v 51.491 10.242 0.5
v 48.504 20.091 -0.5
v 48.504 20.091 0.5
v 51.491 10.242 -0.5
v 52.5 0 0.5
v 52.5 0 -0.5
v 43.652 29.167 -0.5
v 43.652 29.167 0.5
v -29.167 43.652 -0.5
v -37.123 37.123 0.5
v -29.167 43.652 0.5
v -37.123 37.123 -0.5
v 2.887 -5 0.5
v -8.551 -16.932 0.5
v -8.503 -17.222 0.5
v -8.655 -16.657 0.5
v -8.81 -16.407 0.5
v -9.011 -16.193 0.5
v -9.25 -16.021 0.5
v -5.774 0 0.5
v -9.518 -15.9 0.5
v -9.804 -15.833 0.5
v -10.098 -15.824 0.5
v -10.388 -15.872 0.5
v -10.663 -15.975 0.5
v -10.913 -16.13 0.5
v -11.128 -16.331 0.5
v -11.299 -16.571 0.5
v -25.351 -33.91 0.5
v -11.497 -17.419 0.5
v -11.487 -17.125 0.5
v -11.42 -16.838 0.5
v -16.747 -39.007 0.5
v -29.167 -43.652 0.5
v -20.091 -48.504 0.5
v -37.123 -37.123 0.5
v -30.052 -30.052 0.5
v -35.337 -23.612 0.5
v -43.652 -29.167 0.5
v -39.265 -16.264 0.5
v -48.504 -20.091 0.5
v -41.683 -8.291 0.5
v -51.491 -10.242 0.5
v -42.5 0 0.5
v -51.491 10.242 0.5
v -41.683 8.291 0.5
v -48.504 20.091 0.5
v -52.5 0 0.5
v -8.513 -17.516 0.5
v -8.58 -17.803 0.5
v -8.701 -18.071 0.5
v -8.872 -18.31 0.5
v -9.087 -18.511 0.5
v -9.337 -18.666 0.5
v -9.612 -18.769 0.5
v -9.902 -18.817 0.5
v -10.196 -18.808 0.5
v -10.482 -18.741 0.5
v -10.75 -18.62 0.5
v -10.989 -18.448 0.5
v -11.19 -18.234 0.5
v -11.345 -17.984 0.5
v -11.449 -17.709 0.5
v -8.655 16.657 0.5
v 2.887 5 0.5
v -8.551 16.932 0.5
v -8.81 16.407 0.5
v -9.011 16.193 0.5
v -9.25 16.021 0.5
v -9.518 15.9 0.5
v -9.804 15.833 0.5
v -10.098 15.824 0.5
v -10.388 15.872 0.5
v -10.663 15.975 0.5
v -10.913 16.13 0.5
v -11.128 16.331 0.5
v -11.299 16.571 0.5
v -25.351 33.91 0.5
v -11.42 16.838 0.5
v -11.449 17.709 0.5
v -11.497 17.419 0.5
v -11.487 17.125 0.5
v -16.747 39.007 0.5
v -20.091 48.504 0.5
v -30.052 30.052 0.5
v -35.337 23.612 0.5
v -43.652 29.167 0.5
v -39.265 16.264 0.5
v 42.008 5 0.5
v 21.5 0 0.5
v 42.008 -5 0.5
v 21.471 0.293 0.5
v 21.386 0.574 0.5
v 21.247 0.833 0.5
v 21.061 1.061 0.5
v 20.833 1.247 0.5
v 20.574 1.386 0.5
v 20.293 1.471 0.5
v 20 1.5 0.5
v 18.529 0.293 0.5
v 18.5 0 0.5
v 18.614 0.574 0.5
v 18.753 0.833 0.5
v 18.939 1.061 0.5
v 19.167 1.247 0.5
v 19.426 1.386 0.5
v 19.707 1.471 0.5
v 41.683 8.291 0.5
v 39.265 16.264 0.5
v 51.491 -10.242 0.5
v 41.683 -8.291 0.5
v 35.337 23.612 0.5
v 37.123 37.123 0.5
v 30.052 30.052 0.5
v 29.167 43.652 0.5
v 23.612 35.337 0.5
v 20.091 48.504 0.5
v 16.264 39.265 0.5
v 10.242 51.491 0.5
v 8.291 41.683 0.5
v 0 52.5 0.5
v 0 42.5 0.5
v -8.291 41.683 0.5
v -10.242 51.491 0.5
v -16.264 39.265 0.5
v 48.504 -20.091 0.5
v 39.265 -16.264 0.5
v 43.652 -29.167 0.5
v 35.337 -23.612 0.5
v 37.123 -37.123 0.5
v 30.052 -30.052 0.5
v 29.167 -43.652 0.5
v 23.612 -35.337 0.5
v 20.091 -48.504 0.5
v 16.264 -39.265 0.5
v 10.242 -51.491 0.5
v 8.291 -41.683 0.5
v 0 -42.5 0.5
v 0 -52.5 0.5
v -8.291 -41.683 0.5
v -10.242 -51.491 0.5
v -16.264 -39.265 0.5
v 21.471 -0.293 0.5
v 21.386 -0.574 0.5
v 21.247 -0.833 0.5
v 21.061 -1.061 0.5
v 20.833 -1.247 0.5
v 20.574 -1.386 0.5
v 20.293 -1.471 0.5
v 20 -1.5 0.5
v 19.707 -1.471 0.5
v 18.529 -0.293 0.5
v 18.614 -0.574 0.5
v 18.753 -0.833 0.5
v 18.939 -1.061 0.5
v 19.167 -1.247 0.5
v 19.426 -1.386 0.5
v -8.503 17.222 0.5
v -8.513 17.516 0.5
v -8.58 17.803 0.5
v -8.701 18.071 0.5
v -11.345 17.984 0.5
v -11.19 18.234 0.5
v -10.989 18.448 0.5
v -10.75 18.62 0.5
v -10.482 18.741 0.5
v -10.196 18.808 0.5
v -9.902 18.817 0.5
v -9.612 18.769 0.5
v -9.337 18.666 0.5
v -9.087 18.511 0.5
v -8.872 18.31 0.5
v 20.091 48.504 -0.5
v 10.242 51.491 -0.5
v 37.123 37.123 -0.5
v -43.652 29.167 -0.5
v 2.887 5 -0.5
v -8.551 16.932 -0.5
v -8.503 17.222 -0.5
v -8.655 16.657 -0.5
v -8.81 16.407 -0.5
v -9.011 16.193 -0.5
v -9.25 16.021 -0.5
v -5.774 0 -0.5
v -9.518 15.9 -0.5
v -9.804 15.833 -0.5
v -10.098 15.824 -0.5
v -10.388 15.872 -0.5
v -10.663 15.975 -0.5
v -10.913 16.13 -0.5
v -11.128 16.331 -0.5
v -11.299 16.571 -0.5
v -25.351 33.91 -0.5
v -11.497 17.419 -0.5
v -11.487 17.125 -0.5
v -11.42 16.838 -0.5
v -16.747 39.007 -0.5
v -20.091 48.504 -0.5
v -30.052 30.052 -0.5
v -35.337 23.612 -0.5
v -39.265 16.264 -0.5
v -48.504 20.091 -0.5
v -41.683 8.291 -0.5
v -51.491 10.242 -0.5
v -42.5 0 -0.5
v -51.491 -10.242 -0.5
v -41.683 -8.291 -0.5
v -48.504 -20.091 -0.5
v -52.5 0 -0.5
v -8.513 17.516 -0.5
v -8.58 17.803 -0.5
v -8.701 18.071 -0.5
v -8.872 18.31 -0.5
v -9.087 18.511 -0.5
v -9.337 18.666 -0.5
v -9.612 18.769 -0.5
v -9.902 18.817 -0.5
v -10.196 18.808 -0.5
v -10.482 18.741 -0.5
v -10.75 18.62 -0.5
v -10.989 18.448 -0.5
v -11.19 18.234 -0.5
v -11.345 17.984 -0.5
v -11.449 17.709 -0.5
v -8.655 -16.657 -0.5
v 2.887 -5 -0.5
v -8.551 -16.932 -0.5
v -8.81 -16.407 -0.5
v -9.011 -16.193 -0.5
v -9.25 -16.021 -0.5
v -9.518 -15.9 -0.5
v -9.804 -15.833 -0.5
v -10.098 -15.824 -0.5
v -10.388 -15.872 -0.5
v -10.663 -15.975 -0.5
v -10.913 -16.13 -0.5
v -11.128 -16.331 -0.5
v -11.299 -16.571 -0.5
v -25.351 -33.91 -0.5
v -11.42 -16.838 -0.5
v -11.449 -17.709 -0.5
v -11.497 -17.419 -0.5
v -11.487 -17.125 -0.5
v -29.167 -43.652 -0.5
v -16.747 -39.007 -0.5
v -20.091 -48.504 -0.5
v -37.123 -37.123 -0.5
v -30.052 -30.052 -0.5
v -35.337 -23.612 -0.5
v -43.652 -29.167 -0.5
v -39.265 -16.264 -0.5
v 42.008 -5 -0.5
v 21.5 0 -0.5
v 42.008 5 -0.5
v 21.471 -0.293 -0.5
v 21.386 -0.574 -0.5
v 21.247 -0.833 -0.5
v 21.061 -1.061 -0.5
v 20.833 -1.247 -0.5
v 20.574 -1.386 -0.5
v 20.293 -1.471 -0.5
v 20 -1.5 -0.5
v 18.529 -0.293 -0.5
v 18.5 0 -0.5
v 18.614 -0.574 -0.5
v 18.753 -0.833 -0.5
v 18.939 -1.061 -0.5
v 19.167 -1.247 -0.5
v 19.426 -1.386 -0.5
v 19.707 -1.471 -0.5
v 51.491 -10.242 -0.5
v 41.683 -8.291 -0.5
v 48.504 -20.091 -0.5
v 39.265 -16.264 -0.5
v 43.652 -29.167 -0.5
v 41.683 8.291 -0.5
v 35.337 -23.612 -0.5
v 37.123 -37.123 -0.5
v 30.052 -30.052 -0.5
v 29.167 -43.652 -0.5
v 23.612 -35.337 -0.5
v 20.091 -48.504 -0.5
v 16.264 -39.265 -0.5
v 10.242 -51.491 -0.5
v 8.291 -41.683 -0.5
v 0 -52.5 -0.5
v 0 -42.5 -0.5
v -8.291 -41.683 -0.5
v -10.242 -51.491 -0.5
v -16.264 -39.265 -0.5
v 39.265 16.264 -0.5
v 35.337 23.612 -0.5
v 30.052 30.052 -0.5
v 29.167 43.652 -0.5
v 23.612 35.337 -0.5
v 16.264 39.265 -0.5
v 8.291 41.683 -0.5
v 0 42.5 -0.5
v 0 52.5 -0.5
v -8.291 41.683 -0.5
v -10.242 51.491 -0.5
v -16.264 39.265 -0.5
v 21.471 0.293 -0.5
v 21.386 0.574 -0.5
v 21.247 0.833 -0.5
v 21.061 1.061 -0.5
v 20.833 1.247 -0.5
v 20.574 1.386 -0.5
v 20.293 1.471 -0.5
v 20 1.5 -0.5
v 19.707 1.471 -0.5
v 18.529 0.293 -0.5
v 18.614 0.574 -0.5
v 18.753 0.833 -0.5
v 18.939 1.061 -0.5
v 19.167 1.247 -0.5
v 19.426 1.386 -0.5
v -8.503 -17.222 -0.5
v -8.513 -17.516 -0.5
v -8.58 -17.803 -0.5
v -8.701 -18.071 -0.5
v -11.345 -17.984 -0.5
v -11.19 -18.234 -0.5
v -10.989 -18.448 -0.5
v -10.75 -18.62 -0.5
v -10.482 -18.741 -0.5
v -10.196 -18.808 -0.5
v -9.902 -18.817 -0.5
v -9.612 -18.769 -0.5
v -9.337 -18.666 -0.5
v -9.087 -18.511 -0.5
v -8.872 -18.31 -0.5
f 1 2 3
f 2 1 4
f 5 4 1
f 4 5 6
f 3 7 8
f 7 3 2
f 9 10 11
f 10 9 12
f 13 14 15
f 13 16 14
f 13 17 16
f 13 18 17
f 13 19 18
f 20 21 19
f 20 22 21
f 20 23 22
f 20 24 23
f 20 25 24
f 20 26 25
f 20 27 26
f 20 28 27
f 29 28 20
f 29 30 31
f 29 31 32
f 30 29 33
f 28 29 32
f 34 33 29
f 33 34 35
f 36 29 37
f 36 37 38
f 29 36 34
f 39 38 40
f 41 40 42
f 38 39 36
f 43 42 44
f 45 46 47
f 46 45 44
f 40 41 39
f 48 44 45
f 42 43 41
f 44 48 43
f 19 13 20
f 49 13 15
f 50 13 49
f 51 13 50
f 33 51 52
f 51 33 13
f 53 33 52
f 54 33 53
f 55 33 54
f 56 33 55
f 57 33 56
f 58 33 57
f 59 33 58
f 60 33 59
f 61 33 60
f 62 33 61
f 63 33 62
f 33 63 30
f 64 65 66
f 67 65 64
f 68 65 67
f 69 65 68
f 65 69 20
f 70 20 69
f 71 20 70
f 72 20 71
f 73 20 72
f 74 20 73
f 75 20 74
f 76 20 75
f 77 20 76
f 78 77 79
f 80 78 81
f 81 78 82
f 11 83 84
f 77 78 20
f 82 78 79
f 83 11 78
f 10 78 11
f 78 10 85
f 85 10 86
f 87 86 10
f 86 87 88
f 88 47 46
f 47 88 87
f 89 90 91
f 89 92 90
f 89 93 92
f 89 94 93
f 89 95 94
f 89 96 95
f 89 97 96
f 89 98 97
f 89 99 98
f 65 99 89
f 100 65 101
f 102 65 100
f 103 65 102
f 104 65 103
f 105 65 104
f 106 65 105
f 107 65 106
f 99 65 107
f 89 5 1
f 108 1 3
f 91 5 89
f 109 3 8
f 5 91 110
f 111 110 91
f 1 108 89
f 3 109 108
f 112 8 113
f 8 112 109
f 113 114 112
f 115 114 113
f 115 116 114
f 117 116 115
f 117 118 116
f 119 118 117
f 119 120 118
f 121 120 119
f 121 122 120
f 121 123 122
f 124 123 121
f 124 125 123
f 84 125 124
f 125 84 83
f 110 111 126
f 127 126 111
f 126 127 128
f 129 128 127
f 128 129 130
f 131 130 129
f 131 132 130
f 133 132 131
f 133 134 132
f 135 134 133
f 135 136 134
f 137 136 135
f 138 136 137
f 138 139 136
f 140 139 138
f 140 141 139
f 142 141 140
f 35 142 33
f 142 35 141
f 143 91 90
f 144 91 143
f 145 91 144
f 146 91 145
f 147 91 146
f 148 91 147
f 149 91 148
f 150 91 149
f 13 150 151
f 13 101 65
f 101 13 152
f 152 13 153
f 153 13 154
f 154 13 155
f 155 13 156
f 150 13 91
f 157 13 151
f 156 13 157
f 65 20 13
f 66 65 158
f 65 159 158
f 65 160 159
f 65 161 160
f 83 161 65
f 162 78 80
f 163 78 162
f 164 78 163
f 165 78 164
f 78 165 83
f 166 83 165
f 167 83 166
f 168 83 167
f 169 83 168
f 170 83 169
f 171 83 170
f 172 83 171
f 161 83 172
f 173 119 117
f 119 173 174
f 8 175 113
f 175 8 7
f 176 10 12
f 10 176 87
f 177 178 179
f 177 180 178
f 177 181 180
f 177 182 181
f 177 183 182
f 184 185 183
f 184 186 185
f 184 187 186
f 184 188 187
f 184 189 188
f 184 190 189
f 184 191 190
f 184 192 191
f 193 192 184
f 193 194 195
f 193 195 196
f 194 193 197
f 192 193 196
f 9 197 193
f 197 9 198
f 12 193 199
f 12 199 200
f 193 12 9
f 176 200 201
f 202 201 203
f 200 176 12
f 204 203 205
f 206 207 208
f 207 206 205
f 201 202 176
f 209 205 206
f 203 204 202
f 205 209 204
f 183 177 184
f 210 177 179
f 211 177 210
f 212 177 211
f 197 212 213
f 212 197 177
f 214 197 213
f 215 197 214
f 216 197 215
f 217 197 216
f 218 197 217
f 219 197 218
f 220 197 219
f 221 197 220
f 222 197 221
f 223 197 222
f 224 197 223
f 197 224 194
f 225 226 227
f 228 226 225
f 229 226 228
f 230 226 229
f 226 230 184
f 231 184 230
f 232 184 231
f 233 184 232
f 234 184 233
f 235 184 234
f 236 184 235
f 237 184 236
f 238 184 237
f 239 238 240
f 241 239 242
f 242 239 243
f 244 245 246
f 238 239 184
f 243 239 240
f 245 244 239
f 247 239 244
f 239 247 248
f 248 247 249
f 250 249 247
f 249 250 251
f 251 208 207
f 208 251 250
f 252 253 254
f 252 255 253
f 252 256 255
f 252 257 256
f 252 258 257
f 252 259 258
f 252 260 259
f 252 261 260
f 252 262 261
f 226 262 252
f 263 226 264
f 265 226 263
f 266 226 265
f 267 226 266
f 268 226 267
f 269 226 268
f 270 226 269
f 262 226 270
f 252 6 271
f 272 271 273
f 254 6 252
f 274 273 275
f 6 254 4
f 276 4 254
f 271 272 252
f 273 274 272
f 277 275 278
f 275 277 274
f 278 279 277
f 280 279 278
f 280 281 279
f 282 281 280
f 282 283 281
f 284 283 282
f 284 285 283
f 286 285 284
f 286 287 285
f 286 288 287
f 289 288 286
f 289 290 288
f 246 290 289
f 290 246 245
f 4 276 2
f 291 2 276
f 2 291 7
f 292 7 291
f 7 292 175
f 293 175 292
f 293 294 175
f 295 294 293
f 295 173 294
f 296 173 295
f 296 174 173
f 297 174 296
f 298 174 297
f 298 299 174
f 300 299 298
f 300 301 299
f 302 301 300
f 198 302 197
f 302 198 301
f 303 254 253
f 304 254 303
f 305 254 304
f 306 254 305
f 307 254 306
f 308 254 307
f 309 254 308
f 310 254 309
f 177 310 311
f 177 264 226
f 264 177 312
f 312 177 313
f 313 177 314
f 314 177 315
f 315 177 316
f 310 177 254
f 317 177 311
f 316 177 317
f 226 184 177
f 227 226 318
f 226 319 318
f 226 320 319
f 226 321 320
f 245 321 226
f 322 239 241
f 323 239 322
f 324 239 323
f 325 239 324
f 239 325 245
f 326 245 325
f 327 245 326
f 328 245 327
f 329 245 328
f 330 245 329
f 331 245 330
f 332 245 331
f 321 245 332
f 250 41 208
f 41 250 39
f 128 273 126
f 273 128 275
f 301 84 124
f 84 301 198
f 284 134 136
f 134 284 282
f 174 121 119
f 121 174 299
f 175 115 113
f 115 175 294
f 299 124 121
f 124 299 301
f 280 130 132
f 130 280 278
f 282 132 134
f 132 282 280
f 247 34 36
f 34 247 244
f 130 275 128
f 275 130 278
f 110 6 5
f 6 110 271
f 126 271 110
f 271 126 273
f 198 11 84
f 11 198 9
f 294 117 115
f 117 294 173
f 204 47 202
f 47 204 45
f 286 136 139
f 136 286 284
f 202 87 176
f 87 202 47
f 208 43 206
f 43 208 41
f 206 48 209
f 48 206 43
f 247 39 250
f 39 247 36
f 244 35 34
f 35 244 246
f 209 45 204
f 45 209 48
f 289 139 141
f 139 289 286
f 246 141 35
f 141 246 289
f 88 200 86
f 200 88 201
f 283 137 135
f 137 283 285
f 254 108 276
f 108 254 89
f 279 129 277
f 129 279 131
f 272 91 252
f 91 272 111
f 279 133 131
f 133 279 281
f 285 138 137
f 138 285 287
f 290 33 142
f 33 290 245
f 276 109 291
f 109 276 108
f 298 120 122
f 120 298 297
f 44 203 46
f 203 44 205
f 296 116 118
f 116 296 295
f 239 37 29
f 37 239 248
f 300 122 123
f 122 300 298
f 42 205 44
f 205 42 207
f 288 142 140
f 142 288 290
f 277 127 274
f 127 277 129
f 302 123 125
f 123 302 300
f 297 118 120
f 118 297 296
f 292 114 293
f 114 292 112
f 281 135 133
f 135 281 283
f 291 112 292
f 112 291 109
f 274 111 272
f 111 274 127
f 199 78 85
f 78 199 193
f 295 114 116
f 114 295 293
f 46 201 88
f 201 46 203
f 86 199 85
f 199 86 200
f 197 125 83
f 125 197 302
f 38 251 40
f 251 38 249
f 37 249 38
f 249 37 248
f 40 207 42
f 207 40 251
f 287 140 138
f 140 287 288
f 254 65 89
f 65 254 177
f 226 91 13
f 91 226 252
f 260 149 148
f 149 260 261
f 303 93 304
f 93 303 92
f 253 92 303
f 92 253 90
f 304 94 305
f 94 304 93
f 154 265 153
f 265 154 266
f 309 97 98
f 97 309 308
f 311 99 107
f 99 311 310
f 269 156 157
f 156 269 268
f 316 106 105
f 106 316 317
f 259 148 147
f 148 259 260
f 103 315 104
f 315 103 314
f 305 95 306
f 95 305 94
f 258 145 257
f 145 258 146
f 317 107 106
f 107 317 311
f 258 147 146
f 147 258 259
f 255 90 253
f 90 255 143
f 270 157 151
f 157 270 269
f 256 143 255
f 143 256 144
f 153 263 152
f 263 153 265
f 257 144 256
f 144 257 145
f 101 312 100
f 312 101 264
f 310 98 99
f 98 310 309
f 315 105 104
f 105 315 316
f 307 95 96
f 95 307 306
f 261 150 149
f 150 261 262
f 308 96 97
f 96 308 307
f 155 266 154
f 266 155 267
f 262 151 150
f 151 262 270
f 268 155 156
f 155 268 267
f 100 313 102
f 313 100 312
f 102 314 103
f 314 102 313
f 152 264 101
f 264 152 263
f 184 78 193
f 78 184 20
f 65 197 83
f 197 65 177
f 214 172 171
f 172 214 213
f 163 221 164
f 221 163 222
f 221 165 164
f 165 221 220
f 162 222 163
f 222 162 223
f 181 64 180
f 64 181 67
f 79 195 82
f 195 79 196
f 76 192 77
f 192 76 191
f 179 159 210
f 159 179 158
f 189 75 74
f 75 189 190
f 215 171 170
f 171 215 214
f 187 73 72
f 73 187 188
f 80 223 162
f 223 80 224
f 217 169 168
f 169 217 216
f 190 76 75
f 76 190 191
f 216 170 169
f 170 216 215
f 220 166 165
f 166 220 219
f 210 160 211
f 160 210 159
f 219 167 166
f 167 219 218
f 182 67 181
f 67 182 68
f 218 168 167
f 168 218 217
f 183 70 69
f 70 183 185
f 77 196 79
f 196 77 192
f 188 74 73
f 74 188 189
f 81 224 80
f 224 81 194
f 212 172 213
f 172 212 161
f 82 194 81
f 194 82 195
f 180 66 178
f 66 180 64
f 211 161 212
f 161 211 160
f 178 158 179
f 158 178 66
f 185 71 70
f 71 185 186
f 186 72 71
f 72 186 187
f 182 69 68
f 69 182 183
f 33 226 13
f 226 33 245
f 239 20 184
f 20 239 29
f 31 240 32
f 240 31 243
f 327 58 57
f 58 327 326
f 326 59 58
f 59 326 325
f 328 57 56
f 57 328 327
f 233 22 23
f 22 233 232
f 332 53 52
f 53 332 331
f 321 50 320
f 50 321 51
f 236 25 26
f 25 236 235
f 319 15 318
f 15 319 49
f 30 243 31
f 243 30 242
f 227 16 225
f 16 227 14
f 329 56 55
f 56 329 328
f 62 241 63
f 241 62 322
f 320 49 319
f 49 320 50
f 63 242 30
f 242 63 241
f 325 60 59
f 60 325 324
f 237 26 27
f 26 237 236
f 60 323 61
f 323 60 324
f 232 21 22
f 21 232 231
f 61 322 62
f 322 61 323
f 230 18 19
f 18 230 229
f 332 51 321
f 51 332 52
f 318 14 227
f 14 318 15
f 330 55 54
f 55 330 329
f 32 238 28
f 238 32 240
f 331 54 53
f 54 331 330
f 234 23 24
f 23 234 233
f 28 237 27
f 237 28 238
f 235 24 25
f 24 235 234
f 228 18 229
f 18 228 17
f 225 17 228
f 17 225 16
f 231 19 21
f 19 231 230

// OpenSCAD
$fn=32;
diameter=105;         //diameter of object
outer_rim=10;         //width of the outer circle 
thickness=1;          //thickness
support_width=10;     //width of supports
wick_hole_postion=20; //distance from center for each wick
wick_hole_diameter=3; //diameter of hole for wick


module arm() {
     difference(){
        cube([diameter/2*.95,support_width,thickness],center=false);
        translate([wick_hole_postion, support_width/2, -0.1*thickness]) cylinder(r=wick_hole_diameter/2, h=1.2*thickness, center=false);
    }
}

union() {
    difference() {
        cylinder(r=diameter/2,h=thickness,center=true);
        cylinder(r=(diameter/2-(outer_rim)),h=thickness+1,center=true);
    }
    rotate([0,0,0]) 
        translate([0,-support_width/2,-thickness/2]) 
            arm();

    rotate([0,0,120]) 
        translate([0,-support_width/2,-thickness/2]) 
            arm();

    rotate([0,0,240]) 
        translate([0,-support_width/2,-thickness/2]) 
            arm();
}
